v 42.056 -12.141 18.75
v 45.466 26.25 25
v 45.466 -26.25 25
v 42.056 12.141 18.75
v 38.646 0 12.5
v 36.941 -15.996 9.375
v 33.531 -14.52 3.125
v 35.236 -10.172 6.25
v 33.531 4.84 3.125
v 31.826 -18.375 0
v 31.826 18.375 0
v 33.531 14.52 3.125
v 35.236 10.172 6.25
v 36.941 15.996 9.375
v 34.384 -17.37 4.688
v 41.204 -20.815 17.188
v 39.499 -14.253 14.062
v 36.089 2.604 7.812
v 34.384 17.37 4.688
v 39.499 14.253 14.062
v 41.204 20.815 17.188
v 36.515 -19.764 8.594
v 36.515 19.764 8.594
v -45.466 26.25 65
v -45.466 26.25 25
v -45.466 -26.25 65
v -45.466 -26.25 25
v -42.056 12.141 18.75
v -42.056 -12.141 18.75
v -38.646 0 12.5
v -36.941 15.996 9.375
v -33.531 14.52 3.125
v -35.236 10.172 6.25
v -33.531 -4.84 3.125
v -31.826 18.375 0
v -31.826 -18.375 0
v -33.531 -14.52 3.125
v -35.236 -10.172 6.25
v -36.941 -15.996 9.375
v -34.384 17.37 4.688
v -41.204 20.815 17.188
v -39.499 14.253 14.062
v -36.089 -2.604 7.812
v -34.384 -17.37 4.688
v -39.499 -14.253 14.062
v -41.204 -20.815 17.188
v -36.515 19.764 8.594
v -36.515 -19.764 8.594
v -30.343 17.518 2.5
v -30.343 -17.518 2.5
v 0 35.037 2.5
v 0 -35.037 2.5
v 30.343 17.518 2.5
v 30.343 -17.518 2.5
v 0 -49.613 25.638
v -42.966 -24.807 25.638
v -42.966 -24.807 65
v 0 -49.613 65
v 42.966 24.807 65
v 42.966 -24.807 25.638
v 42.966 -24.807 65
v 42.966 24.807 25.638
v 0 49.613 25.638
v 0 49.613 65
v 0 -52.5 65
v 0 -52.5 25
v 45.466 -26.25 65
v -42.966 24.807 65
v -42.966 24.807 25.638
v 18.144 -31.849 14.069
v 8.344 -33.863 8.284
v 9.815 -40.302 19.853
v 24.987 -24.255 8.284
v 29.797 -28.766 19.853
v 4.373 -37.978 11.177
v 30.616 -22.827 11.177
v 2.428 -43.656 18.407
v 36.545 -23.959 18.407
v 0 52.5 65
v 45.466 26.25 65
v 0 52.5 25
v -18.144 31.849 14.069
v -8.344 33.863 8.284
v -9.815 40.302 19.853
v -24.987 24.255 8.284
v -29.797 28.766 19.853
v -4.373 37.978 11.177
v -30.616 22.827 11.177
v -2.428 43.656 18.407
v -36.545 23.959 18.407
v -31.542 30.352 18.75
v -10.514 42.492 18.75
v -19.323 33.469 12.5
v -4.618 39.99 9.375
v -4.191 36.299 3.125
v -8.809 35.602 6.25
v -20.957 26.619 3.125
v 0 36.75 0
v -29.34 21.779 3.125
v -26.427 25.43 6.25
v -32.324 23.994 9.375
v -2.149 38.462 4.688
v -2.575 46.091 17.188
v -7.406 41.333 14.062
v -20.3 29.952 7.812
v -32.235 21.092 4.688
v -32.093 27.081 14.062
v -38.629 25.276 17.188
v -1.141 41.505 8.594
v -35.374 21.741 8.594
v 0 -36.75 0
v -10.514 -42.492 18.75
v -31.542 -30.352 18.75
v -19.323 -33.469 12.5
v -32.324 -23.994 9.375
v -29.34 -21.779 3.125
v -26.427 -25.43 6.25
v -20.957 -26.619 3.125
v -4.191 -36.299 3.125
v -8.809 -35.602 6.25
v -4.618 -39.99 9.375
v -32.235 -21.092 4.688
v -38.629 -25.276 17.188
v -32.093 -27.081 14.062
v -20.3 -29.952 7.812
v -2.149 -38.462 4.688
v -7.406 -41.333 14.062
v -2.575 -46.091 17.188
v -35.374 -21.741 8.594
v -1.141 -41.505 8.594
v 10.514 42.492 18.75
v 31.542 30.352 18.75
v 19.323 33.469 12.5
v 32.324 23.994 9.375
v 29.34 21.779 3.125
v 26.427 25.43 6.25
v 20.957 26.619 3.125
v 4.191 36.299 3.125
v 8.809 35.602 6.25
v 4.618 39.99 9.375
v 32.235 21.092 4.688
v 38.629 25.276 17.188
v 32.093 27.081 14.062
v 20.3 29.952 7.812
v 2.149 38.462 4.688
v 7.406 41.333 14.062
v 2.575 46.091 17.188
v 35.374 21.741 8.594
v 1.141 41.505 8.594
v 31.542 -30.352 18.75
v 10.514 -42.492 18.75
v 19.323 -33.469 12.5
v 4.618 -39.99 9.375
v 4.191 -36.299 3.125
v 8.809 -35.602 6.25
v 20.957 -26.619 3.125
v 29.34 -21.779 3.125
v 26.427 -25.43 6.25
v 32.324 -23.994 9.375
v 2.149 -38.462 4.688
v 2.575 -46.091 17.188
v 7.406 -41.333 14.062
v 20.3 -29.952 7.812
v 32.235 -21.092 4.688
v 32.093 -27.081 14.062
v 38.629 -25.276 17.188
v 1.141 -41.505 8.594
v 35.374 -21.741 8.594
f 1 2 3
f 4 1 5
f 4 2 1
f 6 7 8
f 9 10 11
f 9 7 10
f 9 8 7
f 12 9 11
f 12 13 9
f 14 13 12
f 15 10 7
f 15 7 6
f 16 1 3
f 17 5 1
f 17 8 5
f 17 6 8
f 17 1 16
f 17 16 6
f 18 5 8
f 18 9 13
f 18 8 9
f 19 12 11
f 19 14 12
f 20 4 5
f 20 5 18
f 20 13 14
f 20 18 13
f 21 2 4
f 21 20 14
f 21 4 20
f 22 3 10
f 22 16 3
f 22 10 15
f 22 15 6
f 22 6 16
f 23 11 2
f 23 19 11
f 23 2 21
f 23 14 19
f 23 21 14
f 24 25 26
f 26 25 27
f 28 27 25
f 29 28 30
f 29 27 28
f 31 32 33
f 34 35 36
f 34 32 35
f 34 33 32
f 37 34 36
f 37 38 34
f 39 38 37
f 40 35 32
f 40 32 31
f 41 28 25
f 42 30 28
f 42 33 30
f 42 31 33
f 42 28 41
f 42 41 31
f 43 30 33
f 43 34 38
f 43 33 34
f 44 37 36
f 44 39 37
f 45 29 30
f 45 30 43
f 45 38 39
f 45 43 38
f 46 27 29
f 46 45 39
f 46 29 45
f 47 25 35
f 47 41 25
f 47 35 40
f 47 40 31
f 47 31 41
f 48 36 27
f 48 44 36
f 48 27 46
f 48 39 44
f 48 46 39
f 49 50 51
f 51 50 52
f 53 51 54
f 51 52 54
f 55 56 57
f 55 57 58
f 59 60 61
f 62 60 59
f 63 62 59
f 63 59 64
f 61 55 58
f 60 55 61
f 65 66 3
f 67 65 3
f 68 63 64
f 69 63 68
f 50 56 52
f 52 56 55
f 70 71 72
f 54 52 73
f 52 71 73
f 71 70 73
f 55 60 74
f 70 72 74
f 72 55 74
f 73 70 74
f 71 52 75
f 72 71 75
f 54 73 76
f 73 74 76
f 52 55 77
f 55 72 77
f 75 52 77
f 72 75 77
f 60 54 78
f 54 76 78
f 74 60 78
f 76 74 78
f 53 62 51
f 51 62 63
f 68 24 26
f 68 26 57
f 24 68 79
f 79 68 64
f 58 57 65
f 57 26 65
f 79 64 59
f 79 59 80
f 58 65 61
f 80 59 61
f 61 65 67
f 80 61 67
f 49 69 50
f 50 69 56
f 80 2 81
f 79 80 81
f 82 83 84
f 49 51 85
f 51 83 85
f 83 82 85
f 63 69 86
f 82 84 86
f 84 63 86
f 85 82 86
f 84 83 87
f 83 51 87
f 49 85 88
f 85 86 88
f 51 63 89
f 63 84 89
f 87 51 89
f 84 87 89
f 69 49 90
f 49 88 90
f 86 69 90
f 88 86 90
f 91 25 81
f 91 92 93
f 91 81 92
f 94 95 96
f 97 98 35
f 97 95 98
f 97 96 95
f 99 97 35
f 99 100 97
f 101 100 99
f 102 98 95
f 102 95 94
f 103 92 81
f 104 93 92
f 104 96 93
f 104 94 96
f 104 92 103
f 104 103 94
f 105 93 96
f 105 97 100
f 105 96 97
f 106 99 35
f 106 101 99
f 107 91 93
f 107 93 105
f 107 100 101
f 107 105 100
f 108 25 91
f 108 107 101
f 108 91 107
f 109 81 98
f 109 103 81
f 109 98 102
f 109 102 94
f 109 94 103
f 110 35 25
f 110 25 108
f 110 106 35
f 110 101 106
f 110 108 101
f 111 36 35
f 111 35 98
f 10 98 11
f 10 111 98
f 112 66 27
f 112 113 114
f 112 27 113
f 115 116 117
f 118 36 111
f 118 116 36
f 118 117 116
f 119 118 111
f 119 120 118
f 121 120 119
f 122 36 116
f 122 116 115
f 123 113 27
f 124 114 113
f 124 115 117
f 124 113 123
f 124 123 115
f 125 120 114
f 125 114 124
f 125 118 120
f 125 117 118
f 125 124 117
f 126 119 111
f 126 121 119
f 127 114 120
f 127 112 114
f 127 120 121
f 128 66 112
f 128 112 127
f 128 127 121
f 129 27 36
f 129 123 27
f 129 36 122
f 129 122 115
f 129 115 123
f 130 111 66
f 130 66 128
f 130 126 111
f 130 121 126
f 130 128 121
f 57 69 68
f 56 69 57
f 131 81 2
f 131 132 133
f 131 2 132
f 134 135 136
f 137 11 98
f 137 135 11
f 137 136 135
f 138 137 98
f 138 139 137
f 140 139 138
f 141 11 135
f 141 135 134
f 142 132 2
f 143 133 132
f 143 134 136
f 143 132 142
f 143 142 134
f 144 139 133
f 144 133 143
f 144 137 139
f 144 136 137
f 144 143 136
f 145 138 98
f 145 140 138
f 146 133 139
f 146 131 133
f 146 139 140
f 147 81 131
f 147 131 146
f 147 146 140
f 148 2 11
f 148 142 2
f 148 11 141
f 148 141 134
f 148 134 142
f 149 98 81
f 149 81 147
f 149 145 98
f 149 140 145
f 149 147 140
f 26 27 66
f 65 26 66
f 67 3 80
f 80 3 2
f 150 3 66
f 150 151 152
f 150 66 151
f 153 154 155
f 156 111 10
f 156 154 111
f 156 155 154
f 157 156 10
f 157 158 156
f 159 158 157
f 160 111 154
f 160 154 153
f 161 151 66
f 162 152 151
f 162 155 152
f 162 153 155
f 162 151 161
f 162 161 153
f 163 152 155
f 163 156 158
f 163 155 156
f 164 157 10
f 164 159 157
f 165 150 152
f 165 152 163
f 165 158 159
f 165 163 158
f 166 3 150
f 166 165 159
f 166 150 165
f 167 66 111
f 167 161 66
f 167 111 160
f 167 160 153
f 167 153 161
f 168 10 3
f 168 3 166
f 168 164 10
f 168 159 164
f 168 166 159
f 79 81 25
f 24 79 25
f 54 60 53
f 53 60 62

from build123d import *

# Parameters (mm, degrees)
F6_DEPTH = 40
F7_T     = -2.5


with BuildPart() as f5:
    # F2 (on Top) → F5 section 0
    with BuildSketch(Plane.XY):
        Polygon((-31.8264335891, -18.375), (0, -36.75), (31.8264335891, -18.375), (31.8264335891, 18.375), (0, 36.75), (-31.8264335891, 18.375), align=None)
    # F4 (on offset) → F5 section 1
    with BuildSketch(Plane.XY.offset(25)):
        Polygon((-45.4663336987, -26.25), (0, -52.5), (45.4663336987, -26.25), (45.4663336987, 26.25), (0, 52.5), (-45.4663336987, 26.25), align=None)
    loft()

    # F6 (add): a face of the model
    f6_faces = [f5.faces().sort_by_distance(p)[0] for p in [
        (0, 0, 25),
    ]]
    extrude(f6_faces, amount=F6_DEPTH)

    # F7
    f7_openings = [f5.faces().sort_by_distance(p)[0] for p in [
        (0, 0, 65),
    ]]
    offset(amount=F7_T, openings=f7_openings, kind=Kind.INTERSECTION)


solid = f5.part
